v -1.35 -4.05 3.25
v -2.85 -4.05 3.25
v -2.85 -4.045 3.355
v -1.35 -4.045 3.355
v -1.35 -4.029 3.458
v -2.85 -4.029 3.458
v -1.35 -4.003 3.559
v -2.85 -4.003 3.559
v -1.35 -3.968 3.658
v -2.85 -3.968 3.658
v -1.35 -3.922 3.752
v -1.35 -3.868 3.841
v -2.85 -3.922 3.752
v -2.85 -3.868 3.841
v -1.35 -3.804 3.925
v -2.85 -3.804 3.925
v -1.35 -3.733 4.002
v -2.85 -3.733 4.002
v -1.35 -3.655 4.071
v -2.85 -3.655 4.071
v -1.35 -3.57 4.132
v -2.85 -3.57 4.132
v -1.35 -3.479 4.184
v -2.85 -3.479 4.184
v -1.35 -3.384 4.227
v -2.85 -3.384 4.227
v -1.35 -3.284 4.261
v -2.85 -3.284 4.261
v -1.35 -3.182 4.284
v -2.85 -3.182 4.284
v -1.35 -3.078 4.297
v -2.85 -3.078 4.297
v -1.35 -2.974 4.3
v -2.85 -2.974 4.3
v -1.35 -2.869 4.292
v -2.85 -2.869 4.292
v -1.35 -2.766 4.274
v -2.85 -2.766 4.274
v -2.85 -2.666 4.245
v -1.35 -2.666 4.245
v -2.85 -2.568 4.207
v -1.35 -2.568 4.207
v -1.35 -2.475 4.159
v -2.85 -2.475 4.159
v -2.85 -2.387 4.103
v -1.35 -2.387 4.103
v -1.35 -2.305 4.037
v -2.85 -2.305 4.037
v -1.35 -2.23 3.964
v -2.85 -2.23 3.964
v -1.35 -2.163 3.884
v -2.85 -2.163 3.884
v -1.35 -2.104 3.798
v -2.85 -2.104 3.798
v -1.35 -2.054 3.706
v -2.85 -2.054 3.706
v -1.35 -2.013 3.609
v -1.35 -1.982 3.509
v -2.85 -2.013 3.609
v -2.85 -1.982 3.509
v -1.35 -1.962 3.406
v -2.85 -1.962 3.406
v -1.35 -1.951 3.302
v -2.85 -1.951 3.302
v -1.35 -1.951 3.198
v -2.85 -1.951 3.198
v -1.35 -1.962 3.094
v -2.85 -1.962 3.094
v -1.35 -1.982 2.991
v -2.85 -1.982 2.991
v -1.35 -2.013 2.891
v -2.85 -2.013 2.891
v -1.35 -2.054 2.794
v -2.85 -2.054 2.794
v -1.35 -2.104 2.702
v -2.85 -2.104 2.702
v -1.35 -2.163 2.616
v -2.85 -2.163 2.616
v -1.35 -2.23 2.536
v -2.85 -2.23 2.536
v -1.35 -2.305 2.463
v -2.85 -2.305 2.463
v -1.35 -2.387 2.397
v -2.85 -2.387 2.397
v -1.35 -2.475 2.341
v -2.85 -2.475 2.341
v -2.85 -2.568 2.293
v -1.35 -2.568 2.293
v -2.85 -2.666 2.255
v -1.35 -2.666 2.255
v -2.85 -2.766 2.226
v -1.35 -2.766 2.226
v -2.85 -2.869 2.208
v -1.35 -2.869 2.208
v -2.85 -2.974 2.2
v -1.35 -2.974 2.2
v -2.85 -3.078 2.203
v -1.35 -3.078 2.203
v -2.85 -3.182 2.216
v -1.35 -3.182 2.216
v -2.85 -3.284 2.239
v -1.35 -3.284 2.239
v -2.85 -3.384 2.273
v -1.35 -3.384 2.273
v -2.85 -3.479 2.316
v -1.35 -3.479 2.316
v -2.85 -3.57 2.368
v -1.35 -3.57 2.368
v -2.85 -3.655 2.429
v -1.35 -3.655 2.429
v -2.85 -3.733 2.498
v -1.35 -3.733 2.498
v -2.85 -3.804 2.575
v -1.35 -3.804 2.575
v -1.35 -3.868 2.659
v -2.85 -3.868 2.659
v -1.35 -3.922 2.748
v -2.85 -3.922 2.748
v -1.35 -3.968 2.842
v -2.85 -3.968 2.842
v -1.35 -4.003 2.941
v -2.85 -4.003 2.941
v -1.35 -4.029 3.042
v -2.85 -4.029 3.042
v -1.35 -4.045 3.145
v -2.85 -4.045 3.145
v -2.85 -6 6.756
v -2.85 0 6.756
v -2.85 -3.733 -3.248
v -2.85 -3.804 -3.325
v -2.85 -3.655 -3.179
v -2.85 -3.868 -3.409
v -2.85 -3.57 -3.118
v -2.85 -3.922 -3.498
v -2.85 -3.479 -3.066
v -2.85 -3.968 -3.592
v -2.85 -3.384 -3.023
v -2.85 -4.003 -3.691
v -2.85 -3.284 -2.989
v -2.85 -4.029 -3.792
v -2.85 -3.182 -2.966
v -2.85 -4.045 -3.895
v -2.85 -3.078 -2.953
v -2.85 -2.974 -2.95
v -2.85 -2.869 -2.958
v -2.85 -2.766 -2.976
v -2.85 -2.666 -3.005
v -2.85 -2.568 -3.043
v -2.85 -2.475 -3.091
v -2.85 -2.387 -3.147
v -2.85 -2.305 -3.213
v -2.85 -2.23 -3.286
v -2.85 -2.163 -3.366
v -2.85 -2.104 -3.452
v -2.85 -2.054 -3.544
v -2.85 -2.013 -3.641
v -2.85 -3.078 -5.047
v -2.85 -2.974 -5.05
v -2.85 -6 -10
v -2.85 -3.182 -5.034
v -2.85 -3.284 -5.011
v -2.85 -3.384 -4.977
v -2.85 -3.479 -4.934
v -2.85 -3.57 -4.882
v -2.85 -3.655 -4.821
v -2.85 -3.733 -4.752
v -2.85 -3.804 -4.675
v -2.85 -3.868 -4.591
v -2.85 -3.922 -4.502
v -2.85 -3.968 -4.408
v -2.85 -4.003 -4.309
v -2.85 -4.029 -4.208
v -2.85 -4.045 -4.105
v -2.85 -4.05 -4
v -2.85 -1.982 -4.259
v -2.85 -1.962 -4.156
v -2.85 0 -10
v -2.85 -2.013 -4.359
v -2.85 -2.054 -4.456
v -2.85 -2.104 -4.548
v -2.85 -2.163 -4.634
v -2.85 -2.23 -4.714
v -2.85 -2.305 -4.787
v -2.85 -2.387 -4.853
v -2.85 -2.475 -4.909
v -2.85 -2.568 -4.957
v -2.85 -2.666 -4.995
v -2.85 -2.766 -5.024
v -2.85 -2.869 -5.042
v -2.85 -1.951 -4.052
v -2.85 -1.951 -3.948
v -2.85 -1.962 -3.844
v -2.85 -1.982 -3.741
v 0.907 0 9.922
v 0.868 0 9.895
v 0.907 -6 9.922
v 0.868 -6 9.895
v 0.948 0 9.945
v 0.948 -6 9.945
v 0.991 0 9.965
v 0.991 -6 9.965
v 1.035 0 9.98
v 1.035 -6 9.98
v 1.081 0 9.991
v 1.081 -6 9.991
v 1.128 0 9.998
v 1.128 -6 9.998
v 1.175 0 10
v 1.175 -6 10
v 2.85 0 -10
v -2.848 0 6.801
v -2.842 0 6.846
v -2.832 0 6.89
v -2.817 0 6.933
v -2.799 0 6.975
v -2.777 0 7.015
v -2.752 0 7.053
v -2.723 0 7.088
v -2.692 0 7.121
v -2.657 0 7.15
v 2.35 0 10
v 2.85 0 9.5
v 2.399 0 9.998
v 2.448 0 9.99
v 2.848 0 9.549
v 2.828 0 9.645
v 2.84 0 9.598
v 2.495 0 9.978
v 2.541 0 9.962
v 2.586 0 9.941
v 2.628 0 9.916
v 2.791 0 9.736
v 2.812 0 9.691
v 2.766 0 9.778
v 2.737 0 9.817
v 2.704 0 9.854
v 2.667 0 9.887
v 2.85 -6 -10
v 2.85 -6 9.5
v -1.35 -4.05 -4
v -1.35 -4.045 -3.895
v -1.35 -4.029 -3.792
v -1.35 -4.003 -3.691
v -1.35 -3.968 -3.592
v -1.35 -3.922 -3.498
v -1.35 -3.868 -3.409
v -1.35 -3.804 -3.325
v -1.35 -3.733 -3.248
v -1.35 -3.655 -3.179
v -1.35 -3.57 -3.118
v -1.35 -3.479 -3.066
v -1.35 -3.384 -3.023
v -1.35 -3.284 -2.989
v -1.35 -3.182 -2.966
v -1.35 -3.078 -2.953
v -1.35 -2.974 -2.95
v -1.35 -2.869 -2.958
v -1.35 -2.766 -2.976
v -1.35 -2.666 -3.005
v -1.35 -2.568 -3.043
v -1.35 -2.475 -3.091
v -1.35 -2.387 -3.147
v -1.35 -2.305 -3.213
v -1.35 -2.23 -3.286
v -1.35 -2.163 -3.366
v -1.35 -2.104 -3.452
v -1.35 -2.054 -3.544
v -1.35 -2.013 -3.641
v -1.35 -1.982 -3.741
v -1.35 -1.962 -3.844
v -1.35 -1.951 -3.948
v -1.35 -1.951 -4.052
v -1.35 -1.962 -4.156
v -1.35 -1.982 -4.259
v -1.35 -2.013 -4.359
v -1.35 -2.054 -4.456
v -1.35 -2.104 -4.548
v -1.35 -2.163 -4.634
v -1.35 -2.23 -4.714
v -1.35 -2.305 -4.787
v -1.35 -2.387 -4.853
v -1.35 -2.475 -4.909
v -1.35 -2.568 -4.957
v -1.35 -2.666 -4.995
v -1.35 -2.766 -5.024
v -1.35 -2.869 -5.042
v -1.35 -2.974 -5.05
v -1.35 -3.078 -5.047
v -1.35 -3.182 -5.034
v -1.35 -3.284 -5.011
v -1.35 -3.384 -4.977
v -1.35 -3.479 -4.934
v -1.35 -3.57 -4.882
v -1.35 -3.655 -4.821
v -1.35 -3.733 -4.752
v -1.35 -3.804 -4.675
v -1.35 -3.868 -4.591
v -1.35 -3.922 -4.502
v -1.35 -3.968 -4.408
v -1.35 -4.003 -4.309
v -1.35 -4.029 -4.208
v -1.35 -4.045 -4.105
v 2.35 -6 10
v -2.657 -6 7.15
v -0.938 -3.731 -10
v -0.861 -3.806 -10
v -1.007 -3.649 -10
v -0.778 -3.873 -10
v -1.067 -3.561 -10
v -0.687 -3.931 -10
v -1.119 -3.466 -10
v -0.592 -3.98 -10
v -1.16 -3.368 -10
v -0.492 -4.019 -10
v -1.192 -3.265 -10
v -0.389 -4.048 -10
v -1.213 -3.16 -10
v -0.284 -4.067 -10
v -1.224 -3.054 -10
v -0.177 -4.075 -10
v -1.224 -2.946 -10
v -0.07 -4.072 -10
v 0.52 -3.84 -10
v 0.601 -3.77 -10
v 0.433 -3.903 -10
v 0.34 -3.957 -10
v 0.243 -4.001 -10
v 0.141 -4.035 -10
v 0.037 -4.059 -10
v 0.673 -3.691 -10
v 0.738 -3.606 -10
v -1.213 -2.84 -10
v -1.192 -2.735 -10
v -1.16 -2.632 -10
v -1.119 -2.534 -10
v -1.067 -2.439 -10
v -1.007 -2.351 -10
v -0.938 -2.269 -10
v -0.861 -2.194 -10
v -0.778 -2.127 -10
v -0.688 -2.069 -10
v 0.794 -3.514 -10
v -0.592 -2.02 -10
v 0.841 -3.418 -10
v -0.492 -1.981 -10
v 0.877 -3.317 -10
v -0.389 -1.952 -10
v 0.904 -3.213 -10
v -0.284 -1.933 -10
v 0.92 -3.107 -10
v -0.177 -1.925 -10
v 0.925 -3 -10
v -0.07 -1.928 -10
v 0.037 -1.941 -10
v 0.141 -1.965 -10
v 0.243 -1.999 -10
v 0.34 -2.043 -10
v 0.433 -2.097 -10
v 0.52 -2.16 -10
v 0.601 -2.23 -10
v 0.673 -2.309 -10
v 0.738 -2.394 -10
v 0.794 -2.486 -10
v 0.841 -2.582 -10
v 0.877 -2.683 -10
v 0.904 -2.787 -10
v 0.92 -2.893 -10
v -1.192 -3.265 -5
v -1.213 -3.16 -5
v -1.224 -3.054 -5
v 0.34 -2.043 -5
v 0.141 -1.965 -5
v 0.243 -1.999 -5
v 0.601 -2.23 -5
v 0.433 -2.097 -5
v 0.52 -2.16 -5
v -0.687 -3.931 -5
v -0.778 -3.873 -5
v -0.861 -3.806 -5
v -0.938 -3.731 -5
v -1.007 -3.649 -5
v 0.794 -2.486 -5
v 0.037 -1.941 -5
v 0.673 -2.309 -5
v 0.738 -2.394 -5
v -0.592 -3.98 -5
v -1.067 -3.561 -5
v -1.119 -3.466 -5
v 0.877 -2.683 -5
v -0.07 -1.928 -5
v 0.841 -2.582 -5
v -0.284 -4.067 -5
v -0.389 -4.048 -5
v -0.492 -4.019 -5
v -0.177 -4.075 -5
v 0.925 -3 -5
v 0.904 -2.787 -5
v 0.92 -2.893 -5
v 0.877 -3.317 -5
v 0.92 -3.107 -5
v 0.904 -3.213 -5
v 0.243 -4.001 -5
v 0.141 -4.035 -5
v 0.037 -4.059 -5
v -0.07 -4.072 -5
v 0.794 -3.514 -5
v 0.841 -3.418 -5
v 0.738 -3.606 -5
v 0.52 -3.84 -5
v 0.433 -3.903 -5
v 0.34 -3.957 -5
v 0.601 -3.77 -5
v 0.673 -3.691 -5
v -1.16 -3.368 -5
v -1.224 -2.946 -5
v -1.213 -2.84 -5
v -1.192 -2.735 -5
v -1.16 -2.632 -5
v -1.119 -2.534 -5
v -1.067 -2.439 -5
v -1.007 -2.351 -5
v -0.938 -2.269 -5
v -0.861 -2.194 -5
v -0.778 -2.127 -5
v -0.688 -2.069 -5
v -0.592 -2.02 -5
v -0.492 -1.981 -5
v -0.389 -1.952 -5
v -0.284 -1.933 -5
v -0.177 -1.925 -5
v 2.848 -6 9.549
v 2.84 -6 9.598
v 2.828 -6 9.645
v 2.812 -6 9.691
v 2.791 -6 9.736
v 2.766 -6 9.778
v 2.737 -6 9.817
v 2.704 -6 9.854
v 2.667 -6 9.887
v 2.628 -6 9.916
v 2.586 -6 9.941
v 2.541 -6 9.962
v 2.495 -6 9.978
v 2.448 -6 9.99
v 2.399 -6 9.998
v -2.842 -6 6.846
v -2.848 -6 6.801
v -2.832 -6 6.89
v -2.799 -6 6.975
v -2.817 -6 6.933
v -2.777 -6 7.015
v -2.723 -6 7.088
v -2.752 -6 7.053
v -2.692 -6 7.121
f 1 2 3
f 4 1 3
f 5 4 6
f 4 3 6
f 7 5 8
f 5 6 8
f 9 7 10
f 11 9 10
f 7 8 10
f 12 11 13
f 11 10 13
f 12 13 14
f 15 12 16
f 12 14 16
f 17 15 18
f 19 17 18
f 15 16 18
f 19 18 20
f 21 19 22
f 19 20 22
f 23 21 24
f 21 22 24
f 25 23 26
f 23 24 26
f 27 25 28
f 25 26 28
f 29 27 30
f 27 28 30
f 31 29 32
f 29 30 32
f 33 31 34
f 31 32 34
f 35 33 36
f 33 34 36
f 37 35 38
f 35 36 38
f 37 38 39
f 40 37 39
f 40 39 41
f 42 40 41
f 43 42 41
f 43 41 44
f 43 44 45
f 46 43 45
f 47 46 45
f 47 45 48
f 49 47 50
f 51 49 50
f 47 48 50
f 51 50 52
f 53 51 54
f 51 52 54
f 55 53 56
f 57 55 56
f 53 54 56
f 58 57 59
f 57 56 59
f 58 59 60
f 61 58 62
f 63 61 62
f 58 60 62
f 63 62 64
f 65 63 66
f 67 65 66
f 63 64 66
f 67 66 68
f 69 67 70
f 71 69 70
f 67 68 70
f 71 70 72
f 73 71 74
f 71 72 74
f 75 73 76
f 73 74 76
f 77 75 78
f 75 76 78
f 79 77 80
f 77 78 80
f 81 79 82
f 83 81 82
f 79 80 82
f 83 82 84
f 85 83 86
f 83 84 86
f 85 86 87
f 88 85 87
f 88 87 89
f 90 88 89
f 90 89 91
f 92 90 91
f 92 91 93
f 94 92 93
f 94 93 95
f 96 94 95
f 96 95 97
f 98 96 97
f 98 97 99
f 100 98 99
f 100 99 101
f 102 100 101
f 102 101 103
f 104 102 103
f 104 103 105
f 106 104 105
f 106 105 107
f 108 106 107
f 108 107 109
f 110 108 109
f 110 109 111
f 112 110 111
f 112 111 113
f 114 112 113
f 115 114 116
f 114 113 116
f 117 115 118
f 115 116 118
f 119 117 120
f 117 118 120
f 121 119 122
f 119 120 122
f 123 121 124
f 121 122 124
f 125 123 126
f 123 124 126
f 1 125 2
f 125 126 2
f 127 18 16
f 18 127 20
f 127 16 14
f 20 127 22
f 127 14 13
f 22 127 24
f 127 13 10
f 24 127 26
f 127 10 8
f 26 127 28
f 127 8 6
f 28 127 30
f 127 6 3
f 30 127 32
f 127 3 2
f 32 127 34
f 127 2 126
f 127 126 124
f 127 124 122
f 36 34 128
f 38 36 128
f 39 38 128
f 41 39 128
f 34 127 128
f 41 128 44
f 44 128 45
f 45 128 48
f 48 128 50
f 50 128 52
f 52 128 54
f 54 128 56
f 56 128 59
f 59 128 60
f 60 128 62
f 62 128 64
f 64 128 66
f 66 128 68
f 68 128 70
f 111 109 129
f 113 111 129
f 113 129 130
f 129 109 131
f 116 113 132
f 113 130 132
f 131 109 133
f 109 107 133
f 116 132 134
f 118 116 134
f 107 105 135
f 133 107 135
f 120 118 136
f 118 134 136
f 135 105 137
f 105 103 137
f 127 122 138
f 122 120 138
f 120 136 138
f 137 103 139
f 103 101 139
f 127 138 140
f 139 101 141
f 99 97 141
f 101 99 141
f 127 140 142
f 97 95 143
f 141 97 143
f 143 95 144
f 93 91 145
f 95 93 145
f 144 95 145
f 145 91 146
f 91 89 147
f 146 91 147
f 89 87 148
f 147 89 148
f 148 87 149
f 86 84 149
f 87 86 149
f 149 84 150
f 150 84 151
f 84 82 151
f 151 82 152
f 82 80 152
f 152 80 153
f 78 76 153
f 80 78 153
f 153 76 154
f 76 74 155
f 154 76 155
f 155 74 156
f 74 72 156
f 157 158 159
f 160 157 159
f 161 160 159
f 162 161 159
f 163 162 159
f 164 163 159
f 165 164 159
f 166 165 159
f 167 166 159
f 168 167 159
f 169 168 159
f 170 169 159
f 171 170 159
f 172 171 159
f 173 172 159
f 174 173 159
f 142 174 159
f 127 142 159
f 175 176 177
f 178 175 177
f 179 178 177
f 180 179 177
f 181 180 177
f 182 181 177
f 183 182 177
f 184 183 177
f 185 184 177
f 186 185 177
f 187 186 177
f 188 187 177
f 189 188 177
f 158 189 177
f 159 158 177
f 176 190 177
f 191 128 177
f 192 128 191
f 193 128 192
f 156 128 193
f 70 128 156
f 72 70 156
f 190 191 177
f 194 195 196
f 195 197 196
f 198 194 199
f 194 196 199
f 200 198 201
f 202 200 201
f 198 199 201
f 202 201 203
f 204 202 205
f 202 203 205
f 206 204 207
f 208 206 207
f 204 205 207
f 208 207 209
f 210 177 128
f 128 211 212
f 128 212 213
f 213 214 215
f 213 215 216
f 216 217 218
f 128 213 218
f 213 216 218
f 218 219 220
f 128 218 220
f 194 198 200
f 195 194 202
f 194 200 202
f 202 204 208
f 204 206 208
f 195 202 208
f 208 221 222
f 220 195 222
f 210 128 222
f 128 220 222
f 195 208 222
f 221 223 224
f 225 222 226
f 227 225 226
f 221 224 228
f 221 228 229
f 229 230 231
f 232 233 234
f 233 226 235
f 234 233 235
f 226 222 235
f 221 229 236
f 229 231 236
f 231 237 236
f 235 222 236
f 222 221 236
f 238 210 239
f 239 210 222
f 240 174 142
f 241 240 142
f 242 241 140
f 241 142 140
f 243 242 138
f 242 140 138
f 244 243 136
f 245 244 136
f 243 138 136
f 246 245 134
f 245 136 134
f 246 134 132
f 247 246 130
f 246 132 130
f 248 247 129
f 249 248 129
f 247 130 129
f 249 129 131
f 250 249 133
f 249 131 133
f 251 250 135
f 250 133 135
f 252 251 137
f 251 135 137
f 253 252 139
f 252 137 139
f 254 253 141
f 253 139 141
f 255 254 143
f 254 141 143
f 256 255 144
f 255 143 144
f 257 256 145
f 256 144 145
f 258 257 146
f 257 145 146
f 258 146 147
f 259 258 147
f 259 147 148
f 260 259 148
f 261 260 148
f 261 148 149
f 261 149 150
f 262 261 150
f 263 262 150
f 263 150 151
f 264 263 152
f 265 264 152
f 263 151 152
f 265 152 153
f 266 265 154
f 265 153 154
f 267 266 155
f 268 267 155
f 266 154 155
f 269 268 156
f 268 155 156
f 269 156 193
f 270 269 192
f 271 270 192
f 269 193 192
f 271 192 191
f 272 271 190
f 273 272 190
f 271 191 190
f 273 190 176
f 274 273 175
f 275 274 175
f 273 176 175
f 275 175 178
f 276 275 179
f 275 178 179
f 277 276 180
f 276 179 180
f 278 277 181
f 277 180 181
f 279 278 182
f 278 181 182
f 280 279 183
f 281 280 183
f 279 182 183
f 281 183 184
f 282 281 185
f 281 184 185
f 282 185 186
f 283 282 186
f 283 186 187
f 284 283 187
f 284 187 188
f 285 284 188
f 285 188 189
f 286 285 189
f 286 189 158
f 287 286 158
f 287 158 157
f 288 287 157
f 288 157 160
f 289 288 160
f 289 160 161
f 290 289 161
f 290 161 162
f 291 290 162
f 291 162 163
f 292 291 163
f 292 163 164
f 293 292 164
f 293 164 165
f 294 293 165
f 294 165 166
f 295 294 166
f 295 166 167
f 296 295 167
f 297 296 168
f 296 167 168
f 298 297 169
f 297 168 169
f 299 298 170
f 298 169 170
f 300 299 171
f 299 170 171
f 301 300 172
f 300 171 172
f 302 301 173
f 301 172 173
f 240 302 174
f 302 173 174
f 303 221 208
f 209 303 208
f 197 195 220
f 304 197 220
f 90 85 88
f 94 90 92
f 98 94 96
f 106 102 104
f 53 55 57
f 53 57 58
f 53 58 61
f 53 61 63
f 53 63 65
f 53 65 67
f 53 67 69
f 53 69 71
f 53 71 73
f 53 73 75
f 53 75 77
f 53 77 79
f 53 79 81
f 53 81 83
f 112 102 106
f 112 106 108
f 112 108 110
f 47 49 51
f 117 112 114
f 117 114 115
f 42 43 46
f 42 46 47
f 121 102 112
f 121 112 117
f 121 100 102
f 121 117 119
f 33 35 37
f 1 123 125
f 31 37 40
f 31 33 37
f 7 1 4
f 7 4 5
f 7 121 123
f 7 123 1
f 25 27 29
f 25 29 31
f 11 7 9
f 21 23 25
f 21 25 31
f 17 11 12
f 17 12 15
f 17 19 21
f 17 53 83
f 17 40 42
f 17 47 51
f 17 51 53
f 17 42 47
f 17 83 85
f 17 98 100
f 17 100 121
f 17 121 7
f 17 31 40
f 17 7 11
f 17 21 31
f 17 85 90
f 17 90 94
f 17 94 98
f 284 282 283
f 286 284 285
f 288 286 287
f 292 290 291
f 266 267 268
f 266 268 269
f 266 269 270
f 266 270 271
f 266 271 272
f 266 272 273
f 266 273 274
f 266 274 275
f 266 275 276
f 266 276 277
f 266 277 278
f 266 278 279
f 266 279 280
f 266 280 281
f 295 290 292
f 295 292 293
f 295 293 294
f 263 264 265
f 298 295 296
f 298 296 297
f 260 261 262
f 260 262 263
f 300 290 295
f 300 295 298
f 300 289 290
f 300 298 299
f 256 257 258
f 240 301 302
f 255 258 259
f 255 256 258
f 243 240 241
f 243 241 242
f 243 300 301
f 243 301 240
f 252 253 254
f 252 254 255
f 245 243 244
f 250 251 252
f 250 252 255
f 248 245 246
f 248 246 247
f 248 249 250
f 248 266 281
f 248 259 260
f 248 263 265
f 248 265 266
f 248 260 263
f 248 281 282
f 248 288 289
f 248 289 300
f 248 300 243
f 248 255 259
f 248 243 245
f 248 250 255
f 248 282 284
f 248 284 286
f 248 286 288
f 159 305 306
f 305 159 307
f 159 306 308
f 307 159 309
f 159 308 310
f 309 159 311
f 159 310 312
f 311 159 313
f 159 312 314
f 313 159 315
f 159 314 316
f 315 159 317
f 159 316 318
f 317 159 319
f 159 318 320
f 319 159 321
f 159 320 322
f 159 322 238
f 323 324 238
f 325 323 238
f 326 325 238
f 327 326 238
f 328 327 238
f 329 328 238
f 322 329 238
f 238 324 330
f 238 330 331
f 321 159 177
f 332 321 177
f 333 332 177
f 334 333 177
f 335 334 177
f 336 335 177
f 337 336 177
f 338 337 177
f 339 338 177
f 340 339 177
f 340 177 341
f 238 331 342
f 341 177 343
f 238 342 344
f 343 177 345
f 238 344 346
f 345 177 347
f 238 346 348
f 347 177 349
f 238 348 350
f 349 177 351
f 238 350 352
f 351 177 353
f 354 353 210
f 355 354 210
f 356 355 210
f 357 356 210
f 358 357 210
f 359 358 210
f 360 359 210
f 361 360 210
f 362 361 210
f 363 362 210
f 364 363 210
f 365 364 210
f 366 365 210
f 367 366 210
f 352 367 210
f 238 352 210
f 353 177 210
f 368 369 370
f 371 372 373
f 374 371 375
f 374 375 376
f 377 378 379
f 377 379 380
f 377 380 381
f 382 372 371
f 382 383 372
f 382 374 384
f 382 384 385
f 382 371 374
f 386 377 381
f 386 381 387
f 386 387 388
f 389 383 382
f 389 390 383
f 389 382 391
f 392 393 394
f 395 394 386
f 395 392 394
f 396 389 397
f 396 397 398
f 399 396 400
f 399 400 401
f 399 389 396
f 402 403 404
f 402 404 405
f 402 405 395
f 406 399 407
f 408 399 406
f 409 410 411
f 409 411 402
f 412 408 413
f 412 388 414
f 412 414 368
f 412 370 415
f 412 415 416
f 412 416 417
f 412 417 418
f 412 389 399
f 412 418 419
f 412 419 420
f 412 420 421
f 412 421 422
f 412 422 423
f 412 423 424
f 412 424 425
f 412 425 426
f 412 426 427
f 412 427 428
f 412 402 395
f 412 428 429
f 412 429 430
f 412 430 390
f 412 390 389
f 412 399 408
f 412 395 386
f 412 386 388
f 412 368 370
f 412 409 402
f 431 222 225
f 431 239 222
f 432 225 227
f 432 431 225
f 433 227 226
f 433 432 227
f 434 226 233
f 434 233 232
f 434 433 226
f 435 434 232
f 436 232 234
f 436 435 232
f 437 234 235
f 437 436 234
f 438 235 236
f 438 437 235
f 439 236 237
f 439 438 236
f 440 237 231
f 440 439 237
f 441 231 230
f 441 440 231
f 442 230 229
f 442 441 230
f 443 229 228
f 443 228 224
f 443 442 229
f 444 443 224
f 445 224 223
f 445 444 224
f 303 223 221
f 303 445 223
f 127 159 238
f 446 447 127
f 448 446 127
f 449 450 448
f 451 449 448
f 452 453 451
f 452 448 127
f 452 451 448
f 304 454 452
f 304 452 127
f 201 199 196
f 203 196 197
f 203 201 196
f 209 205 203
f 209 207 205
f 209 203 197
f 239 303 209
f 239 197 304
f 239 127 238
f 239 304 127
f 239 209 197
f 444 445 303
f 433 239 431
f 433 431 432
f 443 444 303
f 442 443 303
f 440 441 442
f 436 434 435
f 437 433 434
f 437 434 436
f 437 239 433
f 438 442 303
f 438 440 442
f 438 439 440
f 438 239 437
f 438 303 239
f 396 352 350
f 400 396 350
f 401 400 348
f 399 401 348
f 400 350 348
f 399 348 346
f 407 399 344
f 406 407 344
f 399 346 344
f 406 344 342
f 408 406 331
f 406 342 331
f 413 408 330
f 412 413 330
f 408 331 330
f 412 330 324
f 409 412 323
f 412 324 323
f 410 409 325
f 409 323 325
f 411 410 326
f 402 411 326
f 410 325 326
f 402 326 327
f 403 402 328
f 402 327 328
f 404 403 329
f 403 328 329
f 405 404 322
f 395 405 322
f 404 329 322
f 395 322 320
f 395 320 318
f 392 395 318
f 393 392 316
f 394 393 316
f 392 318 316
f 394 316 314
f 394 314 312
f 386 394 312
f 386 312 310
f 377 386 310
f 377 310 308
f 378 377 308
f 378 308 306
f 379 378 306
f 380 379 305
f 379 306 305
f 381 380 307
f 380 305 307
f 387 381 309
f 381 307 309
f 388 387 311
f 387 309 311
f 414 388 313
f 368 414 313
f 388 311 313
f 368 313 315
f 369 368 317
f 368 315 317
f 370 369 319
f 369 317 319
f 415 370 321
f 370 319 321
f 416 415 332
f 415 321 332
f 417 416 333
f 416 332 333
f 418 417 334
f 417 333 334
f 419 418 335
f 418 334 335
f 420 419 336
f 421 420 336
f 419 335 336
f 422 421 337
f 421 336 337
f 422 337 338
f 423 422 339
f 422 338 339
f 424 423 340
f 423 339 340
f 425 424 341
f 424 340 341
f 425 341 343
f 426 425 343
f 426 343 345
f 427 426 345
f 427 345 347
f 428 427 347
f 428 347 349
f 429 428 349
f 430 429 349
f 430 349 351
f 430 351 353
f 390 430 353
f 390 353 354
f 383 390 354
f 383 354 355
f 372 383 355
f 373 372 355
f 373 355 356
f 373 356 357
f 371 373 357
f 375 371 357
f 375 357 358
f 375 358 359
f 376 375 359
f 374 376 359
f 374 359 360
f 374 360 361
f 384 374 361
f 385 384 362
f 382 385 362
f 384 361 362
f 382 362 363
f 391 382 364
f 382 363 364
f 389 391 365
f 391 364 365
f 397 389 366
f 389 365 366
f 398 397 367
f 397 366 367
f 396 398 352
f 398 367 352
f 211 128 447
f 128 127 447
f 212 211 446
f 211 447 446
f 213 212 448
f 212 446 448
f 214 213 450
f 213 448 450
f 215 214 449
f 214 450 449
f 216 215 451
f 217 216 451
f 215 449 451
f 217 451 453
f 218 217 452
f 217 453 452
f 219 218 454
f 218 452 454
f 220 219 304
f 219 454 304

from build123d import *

# Parameters (mm, degrees)
F1_DEPTH = 6
F2_R     = 1.05
F3_DEPTH = 1.5
F4_R     = 1.075
F5_DEPTH = 5
F6_R     = 0.5


with BuildPart() as f1:
    # F0 (on Front) → F1 (new body)
    with BuildSketch(Plane.XZ):
        Polygon((-2.85, -10), (2.85, -10), (2.85, 10), (1.00367, 10), (-2.85, 7), align=None)
    extrude(amount=F1_DEPTH)

    # F2 (on face) → F3 (cut)
    with BuildSketch(Plane(origin=(-2.85, 0, 0), x_dir=(0, -1, 0), z_dir=(-1, 0, 0))):
        with Locations((3, -4)):
            Circle(F2_R)
        with Locations((3, 3.25)):
            Circle(F2_R)
    extrude(amount=-F3_DEPTH, mode=Mode.SUBTRACT)

    # F4 (on face) → F5 (cut)
    with BuildSketch(Plane(origin=(0, 0, -10), x_dir=(1, 0, 0), z_dir=(0, 0, -1))):
        with Locations((-0.15, 3)):
            Circle(F4_R)
    extrude(amount=-F5_DEPTH, mode=Mode.SUBTRACT)

    # F6
    f6_edges = [f1.edges().sort_by_distance(p)[0] for p in [
        (2.85, -3, 10),
        (-2.85, -3, 7),
        (1.00367, -3, 10),
    ]]
    fillet(f6_edges, radius=F6_R)


solid = f1.part
